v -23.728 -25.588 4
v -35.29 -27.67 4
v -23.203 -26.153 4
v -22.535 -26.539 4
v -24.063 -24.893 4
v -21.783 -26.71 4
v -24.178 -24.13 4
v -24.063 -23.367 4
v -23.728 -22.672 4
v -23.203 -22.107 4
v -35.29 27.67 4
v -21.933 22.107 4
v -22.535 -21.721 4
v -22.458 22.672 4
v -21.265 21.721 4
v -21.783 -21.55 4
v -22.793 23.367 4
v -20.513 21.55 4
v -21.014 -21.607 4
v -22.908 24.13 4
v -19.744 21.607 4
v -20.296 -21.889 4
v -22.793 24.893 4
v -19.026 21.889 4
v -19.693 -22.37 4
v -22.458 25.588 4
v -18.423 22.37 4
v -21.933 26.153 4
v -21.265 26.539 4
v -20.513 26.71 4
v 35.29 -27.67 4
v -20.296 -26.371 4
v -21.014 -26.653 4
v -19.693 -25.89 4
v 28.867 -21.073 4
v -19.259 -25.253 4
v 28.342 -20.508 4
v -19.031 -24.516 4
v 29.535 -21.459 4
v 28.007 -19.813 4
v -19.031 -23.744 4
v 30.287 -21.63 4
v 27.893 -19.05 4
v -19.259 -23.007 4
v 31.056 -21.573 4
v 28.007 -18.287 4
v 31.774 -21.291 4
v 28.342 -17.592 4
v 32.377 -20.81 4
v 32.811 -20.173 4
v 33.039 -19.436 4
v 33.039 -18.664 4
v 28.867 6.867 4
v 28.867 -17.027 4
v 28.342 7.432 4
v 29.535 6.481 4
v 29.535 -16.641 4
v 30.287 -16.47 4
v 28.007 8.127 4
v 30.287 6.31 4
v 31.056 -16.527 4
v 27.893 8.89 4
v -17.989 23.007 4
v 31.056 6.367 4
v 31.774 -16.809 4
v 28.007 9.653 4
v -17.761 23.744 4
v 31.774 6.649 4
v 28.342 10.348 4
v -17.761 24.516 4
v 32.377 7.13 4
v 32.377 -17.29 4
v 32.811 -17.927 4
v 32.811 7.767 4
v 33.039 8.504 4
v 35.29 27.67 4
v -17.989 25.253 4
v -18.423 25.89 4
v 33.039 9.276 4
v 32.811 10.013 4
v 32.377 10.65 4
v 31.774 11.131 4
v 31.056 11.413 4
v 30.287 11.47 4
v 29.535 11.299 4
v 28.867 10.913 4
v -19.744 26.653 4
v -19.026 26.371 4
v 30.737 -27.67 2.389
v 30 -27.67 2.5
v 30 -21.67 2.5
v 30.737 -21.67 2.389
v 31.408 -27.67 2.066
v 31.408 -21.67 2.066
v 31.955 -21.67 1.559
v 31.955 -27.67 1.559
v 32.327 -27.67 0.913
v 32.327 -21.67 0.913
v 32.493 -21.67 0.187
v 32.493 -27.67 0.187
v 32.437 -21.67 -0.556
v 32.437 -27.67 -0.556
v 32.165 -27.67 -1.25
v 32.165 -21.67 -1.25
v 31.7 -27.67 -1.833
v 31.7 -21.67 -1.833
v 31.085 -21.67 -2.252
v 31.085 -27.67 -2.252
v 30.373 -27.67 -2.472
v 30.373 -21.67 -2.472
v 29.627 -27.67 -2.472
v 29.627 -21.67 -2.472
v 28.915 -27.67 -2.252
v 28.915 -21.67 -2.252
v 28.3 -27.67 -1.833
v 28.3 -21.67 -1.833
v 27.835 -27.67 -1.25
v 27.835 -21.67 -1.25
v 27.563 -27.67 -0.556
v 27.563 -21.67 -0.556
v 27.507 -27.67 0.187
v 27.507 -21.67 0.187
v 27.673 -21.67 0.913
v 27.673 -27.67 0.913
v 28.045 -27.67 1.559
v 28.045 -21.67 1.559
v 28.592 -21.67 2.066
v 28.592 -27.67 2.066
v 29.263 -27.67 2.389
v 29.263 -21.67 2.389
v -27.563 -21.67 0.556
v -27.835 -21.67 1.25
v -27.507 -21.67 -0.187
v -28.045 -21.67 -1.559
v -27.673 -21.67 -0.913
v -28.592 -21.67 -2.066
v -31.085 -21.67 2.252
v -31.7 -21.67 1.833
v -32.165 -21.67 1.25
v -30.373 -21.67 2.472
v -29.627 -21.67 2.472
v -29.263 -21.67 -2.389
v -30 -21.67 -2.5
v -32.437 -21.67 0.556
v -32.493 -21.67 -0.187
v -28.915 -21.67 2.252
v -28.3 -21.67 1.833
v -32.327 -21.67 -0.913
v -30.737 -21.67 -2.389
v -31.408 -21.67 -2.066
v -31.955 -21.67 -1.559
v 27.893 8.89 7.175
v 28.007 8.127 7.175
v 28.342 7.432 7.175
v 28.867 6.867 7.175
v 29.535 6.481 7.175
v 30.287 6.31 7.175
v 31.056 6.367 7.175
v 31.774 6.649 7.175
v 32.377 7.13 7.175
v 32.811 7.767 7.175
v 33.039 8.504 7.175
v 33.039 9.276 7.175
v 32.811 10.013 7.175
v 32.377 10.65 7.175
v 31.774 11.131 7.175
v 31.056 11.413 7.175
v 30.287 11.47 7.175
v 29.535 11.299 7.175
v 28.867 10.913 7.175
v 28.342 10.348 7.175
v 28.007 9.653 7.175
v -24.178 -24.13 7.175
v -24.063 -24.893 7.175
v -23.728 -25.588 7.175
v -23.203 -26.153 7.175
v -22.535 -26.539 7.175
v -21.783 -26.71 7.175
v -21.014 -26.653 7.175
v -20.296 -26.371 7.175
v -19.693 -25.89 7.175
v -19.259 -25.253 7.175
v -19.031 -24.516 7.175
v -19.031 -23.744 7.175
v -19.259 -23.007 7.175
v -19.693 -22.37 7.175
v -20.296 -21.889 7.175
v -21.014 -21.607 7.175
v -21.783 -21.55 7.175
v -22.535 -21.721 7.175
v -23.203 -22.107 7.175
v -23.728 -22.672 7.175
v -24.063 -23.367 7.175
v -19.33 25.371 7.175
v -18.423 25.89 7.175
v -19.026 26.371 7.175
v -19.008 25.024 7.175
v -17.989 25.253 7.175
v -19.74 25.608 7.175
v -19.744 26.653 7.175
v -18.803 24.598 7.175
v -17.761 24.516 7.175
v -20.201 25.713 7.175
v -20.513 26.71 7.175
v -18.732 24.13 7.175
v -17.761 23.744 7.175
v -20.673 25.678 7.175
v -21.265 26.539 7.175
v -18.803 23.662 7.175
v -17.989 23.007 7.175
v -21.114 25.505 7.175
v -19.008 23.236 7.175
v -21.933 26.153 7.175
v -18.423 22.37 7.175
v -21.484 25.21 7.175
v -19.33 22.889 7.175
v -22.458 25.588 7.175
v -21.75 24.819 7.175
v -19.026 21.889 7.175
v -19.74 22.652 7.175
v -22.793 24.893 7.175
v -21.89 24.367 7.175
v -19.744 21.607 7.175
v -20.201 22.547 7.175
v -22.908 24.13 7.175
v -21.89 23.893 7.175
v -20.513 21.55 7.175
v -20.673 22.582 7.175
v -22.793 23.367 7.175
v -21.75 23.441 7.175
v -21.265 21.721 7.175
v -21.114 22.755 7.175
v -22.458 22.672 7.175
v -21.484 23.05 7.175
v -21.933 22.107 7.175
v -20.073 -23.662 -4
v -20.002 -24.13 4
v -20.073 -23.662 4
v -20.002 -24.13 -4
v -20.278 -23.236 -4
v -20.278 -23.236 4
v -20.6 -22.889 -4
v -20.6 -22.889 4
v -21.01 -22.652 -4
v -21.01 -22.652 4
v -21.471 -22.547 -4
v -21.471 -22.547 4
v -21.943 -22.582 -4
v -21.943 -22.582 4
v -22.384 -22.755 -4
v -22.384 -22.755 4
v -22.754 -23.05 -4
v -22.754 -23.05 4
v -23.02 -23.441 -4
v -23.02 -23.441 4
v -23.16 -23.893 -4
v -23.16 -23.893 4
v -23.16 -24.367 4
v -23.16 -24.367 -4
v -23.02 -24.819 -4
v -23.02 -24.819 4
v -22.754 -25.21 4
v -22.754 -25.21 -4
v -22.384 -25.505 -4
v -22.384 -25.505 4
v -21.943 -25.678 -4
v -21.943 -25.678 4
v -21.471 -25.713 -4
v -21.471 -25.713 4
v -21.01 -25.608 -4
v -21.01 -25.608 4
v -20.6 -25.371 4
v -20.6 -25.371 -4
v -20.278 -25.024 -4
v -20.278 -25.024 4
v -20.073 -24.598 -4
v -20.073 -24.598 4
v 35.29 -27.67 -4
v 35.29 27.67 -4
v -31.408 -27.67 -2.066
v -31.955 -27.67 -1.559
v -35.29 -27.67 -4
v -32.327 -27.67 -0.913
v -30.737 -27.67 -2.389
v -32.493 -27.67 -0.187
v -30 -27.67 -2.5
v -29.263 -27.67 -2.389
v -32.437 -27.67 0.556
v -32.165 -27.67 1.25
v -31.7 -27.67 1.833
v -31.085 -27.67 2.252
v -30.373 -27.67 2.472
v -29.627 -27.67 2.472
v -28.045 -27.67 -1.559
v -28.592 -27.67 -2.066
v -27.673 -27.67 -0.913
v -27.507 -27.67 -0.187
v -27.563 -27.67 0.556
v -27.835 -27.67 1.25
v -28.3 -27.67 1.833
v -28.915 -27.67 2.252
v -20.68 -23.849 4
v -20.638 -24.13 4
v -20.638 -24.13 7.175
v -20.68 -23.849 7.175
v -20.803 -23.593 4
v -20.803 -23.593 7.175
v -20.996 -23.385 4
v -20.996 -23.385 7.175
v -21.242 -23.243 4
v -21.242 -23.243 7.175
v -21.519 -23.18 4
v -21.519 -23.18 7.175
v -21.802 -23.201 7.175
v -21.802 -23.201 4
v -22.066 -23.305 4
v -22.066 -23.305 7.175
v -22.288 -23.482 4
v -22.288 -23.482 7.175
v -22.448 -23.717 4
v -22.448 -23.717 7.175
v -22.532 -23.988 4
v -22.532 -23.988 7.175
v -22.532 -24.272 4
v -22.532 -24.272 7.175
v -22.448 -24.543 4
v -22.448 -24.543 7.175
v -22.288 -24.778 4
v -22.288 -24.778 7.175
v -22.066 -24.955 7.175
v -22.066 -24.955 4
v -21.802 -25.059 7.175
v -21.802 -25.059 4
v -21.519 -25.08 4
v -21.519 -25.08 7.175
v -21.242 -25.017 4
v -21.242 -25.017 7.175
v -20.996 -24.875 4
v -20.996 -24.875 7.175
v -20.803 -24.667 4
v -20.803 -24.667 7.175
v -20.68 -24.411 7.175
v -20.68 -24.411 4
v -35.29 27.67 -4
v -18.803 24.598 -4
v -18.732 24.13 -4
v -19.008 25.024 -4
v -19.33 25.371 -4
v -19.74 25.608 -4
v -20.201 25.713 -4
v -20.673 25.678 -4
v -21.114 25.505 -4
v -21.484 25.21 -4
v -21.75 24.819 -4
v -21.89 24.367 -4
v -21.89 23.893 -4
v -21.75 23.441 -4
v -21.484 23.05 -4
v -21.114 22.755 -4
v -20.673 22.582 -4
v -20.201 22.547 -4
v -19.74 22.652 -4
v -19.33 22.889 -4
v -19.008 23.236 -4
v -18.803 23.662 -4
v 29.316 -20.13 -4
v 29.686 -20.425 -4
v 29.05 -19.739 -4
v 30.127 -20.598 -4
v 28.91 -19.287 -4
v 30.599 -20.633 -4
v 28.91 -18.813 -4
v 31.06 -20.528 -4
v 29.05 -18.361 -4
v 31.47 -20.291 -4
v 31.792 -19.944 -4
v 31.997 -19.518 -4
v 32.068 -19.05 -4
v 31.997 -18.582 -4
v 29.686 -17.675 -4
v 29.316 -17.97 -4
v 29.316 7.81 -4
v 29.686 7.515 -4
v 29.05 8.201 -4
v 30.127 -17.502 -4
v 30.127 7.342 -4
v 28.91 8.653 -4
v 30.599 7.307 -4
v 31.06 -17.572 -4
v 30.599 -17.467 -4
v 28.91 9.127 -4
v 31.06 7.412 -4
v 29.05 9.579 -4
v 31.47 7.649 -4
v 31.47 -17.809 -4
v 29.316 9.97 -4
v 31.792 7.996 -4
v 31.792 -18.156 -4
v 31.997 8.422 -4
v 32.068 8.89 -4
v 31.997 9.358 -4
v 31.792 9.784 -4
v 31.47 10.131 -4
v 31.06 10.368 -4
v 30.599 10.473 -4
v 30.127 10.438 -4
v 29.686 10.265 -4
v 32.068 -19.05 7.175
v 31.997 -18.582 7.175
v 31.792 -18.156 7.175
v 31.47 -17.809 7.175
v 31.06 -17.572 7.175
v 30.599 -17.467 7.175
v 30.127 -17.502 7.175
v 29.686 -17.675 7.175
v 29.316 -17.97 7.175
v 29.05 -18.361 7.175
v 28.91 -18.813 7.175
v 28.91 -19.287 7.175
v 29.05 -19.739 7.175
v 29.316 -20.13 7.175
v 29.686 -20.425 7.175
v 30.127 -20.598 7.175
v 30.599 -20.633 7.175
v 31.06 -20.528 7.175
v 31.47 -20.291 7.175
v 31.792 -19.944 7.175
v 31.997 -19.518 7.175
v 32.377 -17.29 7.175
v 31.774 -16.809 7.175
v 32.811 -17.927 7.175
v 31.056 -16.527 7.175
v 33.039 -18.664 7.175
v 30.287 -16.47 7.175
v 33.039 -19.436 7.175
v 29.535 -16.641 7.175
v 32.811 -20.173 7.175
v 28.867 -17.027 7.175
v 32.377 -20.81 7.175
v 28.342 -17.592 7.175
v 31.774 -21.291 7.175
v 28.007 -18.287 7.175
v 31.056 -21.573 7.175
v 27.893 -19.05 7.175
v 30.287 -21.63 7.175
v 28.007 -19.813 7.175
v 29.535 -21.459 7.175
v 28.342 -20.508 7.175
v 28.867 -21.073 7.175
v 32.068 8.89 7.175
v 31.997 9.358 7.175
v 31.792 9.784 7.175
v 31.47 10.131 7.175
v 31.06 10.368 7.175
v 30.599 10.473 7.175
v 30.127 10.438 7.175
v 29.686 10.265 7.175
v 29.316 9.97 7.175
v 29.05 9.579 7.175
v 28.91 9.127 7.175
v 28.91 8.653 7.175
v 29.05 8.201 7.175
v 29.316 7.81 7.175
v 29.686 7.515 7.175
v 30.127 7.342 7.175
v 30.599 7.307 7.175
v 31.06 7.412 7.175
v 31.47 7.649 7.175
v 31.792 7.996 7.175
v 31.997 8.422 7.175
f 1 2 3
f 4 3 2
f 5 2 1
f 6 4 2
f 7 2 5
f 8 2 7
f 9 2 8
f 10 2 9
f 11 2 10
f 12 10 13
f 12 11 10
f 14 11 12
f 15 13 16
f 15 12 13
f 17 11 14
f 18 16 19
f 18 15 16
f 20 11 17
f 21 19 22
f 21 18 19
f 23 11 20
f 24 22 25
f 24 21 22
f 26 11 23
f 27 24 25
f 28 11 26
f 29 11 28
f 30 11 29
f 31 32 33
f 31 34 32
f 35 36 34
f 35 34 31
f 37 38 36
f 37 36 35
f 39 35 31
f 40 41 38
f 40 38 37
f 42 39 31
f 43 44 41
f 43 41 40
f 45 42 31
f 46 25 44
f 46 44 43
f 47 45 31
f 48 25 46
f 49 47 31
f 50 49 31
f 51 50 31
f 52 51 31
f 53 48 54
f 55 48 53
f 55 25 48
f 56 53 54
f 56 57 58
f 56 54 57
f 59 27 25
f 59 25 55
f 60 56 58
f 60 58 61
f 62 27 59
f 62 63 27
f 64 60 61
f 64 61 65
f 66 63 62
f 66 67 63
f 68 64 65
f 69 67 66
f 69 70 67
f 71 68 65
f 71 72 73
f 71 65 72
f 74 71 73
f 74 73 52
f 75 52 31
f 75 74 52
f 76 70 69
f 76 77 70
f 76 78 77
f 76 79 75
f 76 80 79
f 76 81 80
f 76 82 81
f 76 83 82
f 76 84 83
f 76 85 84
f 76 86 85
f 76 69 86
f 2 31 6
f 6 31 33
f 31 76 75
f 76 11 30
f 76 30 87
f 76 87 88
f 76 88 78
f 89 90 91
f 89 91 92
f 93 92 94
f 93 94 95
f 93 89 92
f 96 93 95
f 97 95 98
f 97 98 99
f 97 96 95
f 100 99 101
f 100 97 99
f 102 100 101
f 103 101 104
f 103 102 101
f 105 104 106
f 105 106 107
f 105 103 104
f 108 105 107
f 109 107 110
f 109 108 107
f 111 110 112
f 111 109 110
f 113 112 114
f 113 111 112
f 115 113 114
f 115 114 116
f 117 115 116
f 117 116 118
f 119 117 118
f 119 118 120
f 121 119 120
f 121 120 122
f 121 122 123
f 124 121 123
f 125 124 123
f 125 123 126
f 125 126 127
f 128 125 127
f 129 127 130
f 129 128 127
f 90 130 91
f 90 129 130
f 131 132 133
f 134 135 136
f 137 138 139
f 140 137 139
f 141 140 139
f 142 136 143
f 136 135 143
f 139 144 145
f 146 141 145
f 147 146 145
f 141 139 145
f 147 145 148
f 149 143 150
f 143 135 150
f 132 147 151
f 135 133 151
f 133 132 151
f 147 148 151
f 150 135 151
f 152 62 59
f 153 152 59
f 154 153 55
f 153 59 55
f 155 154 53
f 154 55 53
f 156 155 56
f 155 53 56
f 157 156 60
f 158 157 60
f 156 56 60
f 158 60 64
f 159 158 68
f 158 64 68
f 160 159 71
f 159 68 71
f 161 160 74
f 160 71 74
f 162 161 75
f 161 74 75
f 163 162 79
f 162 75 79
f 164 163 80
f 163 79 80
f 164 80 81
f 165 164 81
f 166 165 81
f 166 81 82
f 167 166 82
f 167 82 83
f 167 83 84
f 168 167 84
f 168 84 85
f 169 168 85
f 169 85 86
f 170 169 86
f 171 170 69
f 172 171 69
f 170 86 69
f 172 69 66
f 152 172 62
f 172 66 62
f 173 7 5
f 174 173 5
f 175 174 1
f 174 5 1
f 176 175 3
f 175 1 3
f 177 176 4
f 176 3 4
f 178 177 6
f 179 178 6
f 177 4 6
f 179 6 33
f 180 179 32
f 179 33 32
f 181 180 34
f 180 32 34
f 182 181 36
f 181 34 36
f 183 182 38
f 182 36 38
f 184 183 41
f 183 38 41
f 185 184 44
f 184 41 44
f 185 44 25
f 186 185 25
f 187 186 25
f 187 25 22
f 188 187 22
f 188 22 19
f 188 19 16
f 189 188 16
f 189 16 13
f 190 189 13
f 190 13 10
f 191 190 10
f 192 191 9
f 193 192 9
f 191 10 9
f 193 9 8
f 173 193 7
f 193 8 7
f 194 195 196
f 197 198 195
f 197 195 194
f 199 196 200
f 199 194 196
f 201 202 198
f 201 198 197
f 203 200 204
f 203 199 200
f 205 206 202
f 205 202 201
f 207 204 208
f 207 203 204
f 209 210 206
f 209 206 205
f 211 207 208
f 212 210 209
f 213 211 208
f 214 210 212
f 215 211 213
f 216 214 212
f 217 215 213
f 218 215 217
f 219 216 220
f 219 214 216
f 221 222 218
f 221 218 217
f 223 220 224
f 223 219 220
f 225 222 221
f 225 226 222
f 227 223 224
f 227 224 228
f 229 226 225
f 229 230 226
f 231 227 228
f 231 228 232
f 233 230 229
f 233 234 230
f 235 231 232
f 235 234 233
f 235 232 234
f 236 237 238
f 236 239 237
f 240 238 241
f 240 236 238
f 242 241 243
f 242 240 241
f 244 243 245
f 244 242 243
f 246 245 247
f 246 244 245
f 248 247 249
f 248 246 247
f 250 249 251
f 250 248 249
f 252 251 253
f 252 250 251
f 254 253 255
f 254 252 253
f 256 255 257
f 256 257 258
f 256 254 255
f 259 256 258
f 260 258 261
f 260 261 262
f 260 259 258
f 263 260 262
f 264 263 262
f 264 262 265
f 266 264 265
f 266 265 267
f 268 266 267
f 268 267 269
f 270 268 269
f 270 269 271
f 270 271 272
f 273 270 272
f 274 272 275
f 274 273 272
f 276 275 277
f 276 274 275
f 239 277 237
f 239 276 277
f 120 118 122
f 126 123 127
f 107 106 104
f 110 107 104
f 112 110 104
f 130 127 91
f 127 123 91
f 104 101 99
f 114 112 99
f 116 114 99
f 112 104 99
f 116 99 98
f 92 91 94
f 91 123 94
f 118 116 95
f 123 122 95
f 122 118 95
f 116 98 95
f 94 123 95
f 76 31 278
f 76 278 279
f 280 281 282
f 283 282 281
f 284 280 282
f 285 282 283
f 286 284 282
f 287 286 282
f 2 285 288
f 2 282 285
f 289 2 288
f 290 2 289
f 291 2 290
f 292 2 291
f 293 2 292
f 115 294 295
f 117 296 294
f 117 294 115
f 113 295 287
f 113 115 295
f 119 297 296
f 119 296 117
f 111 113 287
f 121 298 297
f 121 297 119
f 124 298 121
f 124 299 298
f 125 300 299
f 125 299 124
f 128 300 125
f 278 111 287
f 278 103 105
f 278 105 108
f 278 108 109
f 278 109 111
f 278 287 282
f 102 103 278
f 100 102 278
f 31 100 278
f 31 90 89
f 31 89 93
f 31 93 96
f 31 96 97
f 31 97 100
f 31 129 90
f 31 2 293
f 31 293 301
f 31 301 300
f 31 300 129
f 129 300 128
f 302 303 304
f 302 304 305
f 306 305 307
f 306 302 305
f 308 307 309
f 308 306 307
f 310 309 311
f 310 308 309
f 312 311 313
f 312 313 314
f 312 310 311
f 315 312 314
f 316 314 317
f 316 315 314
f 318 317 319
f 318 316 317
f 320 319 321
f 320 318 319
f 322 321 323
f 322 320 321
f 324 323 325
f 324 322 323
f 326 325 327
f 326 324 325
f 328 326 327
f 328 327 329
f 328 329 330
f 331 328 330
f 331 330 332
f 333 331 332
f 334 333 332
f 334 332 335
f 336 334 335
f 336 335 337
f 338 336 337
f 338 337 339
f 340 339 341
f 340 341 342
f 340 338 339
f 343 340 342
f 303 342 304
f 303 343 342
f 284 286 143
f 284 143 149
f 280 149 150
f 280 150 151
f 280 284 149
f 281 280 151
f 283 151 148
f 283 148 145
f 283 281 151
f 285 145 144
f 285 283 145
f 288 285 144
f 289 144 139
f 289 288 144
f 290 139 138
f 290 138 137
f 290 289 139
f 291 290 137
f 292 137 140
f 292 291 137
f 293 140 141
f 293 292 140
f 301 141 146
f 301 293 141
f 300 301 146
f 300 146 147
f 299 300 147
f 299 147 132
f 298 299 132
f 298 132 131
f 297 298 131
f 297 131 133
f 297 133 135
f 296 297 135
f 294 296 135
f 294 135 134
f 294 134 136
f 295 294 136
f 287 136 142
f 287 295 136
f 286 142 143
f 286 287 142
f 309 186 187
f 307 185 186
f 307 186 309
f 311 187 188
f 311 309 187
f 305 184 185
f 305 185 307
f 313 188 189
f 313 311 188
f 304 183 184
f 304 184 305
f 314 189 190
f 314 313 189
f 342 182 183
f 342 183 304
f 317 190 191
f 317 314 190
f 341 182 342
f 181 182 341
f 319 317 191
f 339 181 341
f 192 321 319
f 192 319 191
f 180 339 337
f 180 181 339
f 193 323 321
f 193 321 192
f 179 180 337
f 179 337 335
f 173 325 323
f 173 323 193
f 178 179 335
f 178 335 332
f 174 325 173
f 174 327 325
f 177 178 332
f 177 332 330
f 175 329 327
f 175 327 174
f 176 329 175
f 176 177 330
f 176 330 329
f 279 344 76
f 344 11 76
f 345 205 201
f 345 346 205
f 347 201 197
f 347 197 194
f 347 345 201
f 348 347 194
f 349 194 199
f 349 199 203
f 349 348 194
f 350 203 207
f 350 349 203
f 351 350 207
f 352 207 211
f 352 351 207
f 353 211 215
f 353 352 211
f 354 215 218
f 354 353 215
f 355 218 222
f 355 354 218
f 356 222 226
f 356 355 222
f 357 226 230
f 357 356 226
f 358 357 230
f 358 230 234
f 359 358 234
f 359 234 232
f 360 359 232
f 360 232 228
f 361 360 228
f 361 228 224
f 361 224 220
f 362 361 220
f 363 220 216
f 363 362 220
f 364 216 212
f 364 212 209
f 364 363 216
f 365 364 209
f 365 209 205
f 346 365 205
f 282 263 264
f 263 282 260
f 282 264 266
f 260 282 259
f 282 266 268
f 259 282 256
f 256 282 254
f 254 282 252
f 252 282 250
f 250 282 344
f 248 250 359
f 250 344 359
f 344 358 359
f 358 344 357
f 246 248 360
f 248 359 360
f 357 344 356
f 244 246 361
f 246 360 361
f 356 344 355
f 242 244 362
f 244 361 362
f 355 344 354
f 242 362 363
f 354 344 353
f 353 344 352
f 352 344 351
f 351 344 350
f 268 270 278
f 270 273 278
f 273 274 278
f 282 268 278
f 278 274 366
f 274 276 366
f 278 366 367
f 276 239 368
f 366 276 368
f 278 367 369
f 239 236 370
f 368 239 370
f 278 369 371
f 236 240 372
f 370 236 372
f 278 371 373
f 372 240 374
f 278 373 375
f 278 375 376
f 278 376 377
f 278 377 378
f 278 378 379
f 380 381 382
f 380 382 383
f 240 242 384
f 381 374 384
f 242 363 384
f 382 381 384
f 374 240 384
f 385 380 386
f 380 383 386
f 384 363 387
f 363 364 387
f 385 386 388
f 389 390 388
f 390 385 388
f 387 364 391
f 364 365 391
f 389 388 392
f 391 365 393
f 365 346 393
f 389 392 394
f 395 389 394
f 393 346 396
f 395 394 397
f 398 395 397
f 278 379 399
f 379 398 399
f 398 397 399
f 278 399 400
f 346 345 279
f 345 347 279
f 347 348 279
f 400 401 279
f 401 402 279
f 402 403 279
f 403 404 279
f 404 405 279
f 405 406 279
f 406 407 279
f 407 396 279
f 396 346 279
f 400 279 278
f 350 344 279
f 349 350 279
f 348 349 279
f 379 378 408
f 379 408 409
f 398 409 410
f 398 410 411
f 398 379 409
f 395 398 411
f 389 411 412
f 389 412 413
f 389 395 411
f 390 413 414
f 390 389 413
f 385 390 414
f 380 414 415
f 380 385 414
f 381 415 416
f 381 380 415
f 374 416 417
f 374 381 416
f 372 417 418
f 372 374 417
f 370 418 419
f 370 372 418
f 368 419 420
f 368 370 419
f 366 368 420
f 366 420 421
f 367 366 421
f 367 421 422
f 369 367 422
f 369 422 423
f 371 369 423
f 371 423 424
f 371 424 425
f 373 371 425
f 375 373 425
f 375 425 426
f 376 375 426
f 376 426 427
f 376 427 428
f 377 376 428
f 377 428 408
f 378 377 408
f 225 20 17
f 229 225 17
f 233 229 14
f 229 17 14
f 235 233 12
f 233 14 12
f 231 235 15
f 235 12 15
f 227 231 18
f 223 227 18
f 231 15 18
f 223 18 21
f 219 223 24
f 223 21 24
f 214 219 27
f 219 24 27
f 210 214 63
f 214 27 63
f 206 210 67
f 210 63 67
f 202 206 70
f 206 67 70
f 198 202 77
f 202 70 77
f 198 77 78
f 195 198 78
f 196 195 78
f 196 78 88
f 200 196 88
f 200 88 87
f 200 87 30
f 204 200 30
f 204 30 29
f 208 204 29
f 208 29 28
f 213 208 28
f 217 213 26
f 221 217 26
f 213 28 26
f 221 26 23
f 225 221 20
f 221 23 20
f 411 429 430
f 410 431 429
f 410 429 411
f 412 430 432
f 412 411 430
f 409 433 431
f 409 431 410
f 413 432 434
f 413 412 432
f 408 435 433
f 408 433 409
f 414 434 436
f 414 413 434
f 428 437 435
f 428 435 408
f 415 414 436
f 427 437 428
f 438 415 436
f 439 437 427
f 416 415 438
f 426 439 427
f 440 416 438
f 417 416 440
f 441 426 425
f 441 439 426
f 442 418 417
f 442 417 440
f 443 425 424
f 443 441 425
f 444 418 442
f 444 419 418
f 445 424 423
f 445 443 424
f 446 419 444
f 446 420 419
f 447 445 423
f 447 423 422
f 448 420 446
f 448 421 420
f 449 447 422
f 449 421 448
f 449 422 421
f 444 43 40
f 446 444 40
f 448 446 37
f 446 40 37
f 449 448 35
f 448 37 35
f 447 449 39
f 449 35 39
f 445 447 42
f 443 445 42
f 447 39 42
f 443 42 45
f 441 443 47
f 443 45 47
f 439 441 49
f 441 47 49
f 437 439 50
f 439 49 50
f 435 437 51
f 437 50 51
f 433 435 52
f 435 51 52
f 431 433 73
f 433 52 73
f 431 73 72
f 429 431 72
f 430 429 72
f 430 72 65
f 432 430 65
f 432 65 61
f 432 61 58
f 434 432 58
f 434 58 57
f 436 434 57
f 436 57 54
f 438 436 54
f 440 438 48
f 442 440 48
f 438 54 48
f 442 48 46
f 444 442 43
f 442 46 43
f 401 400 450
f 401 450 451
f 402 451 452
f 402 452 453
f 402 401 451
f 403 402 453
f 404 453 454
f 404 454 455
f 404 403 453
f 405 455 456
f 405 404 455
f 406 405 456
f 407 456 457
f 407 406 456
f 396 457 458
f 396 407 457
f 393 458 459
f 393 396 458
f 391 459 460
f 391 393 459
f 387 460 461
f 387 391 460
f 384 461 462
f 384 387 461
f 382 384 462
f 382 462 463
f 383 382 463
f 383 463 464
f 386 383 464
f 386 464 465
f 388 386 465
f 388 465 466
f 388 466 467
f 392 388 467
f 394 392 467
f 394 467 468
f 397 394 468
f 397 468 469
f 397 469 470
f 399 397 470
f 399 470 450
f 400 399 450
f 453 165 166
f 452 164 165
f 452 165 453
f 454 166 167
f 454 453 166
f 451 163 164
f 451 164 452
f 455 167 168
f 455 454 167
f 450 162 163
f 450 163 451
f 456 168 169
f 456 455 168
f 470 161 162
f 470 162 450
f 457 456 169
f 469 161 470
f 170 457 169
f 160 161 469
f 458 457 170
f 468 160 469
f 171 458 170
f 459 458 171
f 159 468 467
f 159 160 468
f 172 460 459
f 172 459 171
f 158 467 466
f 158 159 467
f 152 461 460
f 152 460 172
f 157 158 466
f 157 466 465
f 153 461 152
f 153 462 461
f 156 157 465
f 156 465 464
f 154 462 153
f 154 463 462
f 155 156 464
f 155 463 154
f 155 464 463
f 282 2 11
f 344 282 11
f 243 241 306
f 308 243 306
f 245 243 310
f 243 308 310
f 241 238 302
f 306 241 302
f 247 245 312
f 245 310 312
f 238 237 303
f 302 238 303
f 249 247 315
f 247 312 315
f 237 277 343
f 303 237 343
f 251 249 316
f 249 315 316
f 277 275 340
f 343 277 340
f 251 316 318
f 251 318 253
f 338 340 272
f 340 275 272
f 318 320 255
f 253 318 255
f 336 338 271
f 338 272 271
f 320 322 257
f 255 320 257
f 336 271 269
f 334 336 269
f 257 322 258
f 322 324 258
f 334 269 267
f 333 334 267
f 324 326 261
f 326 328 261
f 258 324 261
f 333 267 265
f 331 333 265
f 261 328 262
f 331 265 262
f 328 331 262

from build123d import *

# Parameters (mm, degrees)
SKETCH1_W           = 70.58
SKETCH1_H           = 55.34
SKETCH1_R           = 1.5875
BOSS_EXTRUDE1_DEPTH = 4
SKETCH2_R           = 2.5
CUT_EXTRUDE1_DEPTH  = 6
SKETCH3_R           = 2.5875
SKETCH3_R_2         = 1.5875
SKETCH3_R_3         = 0.9525
BOSS_EXTRUDE2_DEPTH = 3.175


with BuildPart() as part:
    # Sketch1 → Boss-Extrude1 (new, symmetric)
    with BuildSketch(Plane.XY):
        Rectangle(SKETCH1_W, SKETCH1_H)
        with Locations((-20.32, 24.13)):
            Circle(SKETCH1_R, mode=Mode.SUBTRACT)
        with Locations((30.48, 8.89)):
            Circle(SKETCH1_R, mode=Mode.SUBTRACT)
        with Locations((30.48, -19.05)):
            Circle(SKETCH1_R, mode=Mode.SUBTRACT)
        with Locations((-21.59, -24.13)):
            Circle(SKETCH1_R, mode=Mode.SUBTRACT)
    extrude(amount=BOSS_EXTRUDE1_DEPTH, both=True)

    # Sketch2 → Cut-Extrude1 (cut)
    with BuildSketch(Plane(origin=(0, -27.67, 0), x_dir=(1, 0, 0), z_dir=(0, 1, 0))):
        with Locations(Location((30, 0, 0), (0, 0, 270))):
            Circle(SKETCH2_R)
        with Locations(Location((-30, 0, 0), (0, 0, 90))):
            Circle(SKETCH2_R)
    extrude(amount=CUT_EXTRUDE1_DEPTH, mode=Mode.SUBTRACT)

    # Sketch3 → Boss-Extrude2 (add)
    # profile 1 of 4: a face of its own
    with BuildSketch(Plane.XY.offset(4)):
        with Locations(Location((-20.32, 24.13, 0), (0, 0, 180))):
            Circle(SKETCH3_R)
        with Locations((-20.32, 24.13)):
            Circle(SKETCH3_R_2, mode=Mode.SUBTRACT)
    # profile 2 of 4: a face of its own
    with BuildSketch(Plane.XY.offset(4)):
        with Locations(Location((-21.59, -24.13, 0), (0, 0, 180))):
            Circle(SKETCH3_R)
        with Locations((-21.59, -24.13)):
            Circle(SKETCH3_R_3, mode=Mode.SUBTRACT)
    # profile 3 of 4: a face of its own
    with BuildSketch(Plane.XY.offset(4)):
        with Locations(Location((30.48, 8.89, 0), (0, 0, 180))):
            Circle(SKETCH3_R)
        with Locations((30.48, 8.89)):
            Circle(SKETCH3_R_2, mode=Mode.SUBTRACT)
    # profile 4 of 4: a face of its own
    with BuildSketch(Plane.XY.offset(4)):
        with Locations(Location((30.48, -19.05, 0), (0, 0, 180))):
            Circle(SKETCH3_R)
        with Locations((30.48, -19.05)):
            Circle(SKETCH3_R_2, mode=Mode.SUBTRACT)
    extrude(amount=BOSS_EXTRUDE2_DEPTH)


solid = part.part
